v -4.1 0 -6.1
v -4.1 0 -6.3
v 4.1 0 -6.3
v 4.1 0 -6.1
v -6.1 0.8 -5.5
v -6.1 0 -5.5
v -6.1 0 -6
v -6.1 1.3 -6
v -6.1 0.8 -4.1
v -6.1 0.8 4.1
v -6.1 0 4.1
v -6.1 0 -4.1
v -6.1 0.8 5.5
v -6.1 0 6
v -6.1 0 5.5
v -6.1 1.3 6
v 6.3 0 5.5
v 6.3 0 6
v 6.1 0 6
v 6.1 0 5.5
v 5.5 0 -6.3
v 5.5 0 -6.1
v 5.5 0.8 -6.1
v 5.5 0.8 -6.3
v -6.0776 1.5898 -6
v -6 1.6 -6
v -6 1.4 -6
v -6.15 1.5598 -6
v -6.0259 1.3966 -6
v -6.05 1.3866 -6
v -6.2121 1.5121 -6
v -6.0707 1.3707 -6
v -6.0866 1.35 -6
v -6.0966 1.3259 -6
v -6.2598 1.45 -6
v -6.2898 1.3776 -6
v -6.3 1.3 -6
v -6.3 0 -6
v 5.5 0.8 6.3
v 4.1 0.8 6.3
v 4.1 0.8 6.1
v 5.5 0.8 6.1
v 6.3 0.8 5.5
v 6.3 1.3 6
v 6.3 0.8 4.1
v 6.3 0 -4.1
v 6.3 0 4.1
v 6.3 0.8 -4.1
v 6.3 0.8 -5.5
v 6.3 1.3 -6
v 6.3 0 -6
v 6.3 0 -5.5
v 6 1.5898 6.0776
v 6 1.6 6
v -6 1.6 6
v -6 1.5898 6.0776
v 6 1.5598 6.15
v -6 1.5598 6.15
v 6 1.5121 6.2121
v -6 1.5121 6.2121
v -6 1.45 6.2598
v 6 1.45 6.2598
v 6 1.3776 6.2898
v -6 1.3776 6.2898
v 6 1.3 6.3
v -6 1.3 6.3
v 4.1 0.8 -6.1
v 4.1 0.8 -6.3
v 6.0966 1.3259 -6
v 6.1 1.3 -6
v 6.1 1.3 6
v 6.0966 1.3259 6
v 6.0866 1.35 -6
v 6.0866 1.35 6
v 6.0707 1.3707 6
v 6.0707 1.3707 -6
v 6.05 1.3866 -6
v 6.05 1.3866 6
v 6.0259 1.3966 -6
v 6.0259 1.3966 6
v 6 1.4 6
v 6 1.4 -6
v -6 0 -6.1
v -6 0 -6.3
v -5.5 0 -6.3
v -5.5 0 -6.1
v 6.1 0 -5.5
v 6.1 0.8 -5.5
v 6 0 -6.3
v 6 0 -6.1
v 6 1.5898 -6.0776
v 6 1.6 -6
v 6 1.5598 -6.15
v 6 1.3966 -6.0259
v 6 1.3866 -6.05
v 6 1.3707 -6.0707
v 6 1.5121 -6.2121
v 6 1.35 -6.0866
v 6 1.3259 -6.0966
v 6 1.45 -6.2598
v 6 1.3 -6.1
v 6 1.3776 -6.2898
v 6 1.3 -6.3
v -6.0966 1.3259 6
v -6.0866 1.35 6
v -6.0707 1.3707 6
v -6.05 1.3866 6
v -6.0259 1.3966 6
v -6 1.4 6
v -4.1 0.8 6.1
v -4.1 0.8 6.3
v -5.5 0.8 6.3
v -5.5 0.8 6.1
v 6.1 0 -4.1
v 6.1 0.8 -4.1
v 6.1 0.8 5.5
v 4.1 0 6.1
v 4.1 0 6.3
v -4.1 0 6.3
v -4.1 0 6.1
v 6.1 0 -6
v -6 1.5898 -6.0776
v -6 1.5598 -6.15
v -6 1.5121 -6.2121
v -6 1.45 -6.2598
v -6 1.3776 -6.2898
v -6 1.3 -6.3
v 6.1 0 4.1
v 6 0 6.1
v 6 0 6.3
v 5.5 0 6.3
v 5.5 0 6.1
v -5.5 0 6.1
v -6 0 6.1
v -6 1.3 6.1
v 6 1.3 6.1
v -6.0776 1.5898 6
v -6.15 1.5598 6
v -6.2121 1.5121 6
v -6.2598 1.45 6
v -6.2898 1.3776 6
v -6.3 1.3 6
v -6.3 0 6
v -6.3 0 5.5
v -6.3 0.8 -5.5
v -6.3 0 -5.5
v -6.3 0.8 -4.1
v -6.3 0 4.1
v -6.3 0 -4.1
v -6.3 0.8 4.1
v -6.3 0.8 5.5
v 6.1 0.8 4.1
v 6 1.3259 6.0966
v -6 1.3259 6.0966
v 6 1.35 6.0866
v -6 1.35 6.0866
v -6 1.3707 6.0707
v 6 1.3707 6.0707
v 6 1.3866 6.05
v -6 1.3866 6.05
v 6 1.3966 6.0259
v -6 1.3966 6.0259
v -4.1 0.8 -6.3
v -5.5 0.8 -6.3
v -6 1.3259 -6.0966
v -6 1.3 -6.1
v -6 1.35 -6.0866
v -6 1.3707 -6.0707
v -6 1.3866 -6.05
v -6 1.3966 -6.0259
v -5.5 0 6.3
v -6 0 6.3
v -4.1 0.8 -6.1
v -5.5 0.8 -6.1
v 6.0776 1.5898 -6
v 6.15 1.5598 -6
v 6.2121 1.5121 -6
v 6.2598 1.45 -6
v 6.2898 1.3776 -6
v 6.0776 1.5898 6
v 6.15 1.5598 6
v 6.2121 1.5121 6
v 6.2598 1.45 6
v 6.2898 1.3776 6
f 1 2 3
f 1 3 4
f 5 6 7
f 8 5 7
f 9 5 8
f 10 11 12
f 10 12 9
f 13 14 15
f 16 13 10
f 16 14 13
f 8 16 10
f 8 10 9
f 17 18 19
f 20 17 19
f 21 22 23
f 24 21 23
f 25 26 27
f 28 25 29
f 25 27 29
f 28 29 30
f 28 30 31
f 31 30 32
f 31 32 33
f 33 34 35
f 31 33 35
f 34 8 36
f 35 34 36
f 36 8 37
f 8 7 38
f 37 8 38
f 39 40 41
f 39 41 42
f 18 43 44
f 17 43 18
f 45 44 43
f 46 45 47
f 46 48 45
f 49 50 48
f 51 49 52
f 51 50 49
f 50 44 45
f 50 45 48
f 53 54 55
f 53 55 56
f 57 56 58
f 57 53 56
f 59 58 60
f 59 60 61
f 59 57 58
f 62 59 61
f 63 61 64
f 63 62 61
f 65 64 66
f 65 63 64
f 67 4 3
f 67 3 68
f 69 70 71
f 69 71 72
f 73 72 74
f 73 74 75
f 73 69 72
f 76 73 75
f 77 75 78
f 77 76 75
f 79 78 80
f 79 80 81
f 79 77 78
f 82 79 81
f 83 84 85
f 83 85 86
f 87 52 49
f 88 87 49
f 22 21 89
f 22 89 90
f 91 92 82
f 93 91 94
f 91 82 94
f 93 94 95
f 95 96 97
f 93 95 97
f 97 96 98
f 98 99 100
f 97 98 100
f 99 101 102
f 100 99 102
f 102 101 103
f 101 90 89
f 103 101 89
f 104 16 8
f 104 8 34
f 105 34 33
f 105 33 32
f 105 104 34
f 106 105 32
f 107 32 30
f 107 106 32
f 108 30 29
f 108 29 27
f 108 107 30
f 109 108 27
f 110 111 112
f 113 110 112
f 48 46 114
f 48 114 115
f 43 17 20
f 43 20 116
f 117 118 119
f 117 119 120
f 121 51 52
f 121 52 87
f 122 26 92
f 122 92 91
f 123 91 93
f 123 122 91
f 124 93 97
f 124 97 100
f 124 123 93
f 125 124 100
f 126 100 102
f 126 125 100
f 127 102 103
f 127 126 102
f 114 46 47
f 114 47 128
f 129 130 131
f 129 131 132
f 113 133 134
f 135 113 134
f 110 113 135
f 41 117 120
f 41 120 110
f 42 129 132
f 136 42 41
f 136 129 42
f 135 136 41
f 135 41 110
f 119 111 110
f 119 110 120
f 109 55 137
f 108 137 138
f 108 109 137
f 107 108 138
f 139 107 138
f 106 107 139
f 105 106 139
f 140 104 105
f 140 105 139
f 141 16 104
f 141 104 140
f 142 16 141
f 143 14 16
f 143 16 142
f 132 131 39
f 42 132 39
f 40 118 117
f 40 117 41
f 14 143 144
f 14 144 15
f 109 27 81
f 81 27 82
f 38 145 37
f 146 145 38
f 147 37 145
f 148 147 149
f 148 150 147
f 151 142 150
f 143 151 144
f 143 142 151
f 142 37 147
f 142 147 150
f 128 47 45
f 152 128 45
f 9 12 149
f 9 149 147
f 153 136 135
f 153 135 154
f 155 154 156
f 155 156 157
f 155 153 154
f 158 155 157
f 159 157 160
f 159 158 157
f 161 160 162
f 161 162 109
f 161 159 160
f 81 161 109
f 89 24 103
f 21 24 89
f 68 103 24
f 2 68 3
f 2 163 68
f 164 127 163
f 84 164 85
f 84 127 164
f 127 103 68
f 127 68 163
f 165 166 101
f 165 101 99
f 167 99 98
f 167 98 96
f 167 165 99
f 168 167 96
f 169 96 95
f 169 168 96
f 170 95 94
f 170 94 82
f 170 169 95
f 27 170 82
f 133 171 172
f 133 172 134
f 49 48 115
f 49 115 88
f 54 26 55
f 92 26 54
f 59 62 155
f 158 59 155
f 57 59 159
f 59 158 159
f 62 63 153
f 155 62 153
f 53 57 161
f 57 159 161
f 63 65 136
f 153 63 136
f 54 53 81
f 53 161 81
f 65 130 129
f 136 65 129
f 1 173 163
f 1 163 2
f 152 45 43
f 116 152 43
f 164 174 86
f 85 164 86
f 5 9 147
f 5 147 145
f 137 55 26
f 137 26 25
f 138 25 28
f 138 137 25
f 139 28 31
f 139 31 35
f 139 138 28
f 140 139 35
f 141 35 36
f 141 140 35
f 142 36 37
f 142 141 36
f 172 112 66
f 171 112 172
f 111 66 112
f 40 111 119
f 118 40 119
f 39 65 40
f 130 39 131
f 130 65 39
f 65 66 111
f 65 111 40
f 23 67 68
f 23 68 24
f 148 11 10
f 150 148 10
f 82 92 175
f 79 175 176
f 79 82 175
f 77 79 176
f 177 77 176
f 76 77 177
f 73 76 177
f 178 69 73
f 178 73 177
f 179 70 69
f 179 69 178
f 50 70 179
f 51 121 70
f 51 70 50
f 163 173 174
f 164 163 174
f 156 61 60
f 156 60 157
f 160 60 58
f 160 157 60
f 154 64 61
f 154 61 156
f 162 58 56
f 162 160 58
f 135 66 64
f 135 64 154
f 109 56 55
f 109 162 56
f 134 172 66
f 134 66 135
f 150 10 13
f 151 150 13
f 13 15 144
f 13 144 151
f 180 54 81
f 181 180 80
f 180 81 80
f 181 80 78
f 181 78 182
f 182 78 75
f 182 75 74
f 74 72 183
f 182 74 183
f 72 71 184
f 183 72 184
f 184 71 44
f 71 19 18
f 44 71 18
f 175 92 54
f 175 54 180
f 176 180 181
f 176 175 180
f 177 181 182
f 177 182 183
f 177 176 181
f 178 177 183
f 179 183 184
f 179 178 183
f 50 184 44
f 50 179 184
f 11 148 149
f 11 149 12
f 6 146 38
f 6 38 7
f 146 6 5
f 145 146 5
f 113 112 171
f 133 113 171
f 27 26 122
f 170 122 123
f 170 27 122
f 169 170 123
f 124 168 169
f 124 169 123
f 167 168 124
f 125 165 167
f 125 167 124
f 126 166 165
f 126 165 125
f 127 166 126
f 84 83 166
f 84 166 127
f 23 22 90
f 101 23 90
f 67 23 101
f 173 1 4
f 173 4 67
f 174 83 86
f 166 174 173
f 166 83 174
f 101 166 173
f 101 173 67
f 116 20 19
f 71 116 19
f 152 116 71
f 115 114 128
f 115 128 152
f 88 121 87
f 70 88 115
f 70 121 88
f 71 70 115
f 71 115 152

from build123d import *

# Parameters (mm, degrees)
BASES_W             = 12
BASES_H             = 12
BASE_DEPTH          = 0.2
EDGE_FLANGE1_DEPTH  = 12
EDGE_FLANGE2_DEPTH  = 12
EDGE_FLANGE3_DEPTH  = 12
EDGE_FLANGE4_DEPTH  = 12
VENTS_W             = 1.4
VENTS_H             = 0.8
VENT_DEPTH          = 10.052071586
VCP_COUNT           = 2
VCP_ANGLE           = 90
VCP_COPY_1_SKETCH_W = 1.4
VCP_COPY_1_SKETCH_H = 0.8
VCP_COPY_1_DEPTH    = 10.052071586


# Sheet-metal steps are written as plain solids
with BuildPart() as part:
    # BaseS → Base (new body)
    with BuildSketch(Plane(origin=(0, 1.6, 0), x_dir=(1, 0, 0), z_dir=(0, 1, 0))):
        Rectangle(BASES_W, BASES_H)
    extrude(amount=-BASE_DEPTH)

    # Edge-Flange1 section (across the edge) → Edge-Flange1 (add)
    with BuildSketch(Plane(origin=(6, 1.4, 6.1), x_dir=(0, 0, -1), z_dir=(-1, 0, 0))):
        with BuildLine():
            Line((-0.2, 0.1), (-0.2, 1.4))
            Line((-0.2, 1.4), (0, 1.4))
            Line((0, 1.4), (0, 0.1))
            ThreePointArc((0, 0.1), (0.029289322, 0.029289322), (0.1, 0))
            Line((0.1, 0), (0.1, -0.2))
            ThreePointArc((0.1, -0.2), (-0.112132034, -0.112132034), (-0.2, 0.1))
        make_face()
    extrude(amount=EDGE_FLANGE1_DEPTH)

    # Edge-Flange2 section (across the edge) → Edge-Flange2 (add)
    with BuildSketch(Plane(origin=(-6, 1.4, -6.1), x_dir=(0, 0, 1), z_dir=(1, 0, 0))):
        with BuildLine():
            Line((-0.2, 0.1), (-0.2, 1.4))
            Line((-0.2, 1.4), (0, 1.4))
            Line((0, 1.4), (0, 0.1))
            ThreePointArc((0, 0.1), (0.029289322, 0.029289322), (0.1, 0))
            Line((0.1, 0), (0.1, -0.2))
            ThreePointArc((0.1, -0.2), (-0.112132034, -0.112132034), (-0.2, 0.1))
        make_face()
    extrude(amount=EDGE_FLANGE2_DEPTH)

    # Edge-Flange3 section (across the edge) → Edge-Flange3 (add)
    with BuildSketch(Plane(origin=(6.1, 1.4, -6), x_dir=(-1, 0, 0), z_dir=(0, 0, 1))):
        with BuildLine():
            Line((-0.2, 0.1), (-0.2, 1.4))
            Line((-0.2, 1.4), (0, 1.4))
            Line((0, 1.4), (0, 0.1))
            ThreePointArc((0, 0.1), (0.029289322, 0.029289322), (0.1, 0))
            Line((0.1, 0), (0.1, -0.2))
            ThreePointArc((0.1, -0.2), (-0.112132034, -0.112132034), (-0.2, 0.1))
        make_face()
    extrude(amount=EDGE_FLANGE3_DEPTH)

    # Edge-Flange4 section (across the edge) → Edge-Flange4 (add)
    with BuildSketch(Plane(origin=(-6.1, 1.4, 6), x_dir=(1, 0, 0), z_dir=(0, 0, -1))):
        with BuildLine():
            Line((-0.2, 0.1), (-0.2, 1.4))
            Line((-0.2, 1.4), (0, 1.4))
            Line((0, 1.4), (0, 0.1))
            ThreePointArc((0, 0.1), (0.029289322, 0.029289322), (0.1, 0))
            Line((0.1, 0), (0.1, -0.2))
            ThreePointArc((0.1, -0.2), (-0.112132034, -0.112132034), (-0.2, 0.1))
        make_face()
    extrude(amount=EDGE_FLANGE4_DEPTH)

    # VentS → Vent (cut, symmetric)
    with BuildSketch(Plane(origin=(0, 0, 0), x_dir=(0, 0, -1), z_dir=(1, 0, 0))):
        with Locations((4.8, 0.4)):
            Rectangle(VENTS_W, VENTS_H)
    vent = extrude(amount=VENT_DEPTH, both=True, mode=Mode.SUBTRACT)

    # VHM: Vent across plane
    add(vent.mirror(Plane.XY), mode=Mode.SUBTRACT)

    # VCP: Vent ×2 about axis
    vcp_axis = Axis((0, 1.68, 0), (0, -1, 0))
    for i in range(1, VCP_COUNT):
        add(vent.rotate(vcp_axis, i * VCP_ANGLE / (VCP_COUNT - 1)), mode=Mode.SUBTRACT)

    # VCP copy 1 sketch → VCP copy 1 (cut, symmetric)
    with BuildSketch(Plane(origin=(0, 0, 0), x_dir=(-1, 0, 0), z_dir=(0, 0, 1))):
        with Locations((4.8, -0.4)):
            Rectangle(VCP_COPY_1_SKETCH_W, VCP_COPY_1_SKETCH_H)
    extrude(amount=VCP_COPY_1_DEPTH, both=True, mode=Mode.SUBTRACT)


solid = part.part
